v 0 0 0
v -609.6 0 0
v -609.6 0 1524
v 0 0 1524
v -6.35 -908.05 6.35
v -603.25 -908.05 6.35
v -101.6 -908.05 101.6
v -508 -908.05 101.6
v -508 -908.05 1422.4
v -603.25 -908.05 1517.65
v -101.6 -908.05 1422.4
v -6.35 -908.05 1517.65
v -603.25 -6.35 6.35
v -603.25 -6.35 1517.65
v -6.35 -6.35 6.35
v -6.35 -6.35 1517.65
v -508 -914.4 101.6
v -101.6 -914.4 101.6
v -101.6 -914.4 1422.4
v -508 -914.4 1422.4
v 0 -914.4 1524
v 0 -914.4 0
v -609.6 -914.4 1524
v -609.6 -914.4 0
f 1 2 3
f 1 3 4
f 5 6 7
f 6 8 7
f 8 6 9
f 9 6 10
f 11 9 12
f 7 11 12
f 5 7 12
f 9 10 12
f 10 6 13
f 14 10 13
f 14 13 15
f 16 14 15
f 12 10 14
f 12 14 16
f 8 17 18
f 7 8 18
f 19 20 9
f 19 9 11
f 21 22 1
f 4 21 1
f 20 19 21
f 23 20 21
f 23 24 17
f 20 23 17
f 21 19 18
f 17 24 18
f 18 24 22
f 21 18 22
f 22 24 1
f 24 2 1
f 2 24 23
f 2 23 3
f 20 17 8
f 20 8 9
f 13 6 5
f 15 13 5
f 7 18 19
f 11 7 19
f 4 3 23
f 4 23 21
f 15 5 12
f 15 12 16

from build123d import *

# Parameters (mm, degrees)
F0_W     = 609.6
F0_H     = 914.4
F1_DEPTH = 1524
F2_T     = -6.35
F3_W     = 609.6
F3_H     = 1524
F3_W_2   = 406.4
F3_H_2   = 1320.8
F4_DEPTH = 6.35


with BuildPart() as f1:
    # F0 (on Top) → F1 (new body)
    with BuildSketch(Plane.XY):
        with Locations((-304.8, -457.2)):
            Rectangle(F0_W, F0_H)
    extrude(amount=F1_DEPTH)

    # F2
    f2_openings = [f1.faces().sort_by_distance(p)[0] for p in [
        (-304.8, -914.4, 762),
    ]]
    offset(amount=F2_T, openings=f2_openings)

    # F3 (on face) → F4 (join)
    with BuildSketch(Plane.XZ.offset(914.4)):
        with Locations((-304.8, 762)):
            Rectangle(F3_W, F3_H)
        with Locations((-304.8, 762)):
            Rectangle(F3_W_2, F3_H_2, mode=Mode.SUBTRACT)
    extrude(amount=-F4_DEPTH)


solid = f1.part
